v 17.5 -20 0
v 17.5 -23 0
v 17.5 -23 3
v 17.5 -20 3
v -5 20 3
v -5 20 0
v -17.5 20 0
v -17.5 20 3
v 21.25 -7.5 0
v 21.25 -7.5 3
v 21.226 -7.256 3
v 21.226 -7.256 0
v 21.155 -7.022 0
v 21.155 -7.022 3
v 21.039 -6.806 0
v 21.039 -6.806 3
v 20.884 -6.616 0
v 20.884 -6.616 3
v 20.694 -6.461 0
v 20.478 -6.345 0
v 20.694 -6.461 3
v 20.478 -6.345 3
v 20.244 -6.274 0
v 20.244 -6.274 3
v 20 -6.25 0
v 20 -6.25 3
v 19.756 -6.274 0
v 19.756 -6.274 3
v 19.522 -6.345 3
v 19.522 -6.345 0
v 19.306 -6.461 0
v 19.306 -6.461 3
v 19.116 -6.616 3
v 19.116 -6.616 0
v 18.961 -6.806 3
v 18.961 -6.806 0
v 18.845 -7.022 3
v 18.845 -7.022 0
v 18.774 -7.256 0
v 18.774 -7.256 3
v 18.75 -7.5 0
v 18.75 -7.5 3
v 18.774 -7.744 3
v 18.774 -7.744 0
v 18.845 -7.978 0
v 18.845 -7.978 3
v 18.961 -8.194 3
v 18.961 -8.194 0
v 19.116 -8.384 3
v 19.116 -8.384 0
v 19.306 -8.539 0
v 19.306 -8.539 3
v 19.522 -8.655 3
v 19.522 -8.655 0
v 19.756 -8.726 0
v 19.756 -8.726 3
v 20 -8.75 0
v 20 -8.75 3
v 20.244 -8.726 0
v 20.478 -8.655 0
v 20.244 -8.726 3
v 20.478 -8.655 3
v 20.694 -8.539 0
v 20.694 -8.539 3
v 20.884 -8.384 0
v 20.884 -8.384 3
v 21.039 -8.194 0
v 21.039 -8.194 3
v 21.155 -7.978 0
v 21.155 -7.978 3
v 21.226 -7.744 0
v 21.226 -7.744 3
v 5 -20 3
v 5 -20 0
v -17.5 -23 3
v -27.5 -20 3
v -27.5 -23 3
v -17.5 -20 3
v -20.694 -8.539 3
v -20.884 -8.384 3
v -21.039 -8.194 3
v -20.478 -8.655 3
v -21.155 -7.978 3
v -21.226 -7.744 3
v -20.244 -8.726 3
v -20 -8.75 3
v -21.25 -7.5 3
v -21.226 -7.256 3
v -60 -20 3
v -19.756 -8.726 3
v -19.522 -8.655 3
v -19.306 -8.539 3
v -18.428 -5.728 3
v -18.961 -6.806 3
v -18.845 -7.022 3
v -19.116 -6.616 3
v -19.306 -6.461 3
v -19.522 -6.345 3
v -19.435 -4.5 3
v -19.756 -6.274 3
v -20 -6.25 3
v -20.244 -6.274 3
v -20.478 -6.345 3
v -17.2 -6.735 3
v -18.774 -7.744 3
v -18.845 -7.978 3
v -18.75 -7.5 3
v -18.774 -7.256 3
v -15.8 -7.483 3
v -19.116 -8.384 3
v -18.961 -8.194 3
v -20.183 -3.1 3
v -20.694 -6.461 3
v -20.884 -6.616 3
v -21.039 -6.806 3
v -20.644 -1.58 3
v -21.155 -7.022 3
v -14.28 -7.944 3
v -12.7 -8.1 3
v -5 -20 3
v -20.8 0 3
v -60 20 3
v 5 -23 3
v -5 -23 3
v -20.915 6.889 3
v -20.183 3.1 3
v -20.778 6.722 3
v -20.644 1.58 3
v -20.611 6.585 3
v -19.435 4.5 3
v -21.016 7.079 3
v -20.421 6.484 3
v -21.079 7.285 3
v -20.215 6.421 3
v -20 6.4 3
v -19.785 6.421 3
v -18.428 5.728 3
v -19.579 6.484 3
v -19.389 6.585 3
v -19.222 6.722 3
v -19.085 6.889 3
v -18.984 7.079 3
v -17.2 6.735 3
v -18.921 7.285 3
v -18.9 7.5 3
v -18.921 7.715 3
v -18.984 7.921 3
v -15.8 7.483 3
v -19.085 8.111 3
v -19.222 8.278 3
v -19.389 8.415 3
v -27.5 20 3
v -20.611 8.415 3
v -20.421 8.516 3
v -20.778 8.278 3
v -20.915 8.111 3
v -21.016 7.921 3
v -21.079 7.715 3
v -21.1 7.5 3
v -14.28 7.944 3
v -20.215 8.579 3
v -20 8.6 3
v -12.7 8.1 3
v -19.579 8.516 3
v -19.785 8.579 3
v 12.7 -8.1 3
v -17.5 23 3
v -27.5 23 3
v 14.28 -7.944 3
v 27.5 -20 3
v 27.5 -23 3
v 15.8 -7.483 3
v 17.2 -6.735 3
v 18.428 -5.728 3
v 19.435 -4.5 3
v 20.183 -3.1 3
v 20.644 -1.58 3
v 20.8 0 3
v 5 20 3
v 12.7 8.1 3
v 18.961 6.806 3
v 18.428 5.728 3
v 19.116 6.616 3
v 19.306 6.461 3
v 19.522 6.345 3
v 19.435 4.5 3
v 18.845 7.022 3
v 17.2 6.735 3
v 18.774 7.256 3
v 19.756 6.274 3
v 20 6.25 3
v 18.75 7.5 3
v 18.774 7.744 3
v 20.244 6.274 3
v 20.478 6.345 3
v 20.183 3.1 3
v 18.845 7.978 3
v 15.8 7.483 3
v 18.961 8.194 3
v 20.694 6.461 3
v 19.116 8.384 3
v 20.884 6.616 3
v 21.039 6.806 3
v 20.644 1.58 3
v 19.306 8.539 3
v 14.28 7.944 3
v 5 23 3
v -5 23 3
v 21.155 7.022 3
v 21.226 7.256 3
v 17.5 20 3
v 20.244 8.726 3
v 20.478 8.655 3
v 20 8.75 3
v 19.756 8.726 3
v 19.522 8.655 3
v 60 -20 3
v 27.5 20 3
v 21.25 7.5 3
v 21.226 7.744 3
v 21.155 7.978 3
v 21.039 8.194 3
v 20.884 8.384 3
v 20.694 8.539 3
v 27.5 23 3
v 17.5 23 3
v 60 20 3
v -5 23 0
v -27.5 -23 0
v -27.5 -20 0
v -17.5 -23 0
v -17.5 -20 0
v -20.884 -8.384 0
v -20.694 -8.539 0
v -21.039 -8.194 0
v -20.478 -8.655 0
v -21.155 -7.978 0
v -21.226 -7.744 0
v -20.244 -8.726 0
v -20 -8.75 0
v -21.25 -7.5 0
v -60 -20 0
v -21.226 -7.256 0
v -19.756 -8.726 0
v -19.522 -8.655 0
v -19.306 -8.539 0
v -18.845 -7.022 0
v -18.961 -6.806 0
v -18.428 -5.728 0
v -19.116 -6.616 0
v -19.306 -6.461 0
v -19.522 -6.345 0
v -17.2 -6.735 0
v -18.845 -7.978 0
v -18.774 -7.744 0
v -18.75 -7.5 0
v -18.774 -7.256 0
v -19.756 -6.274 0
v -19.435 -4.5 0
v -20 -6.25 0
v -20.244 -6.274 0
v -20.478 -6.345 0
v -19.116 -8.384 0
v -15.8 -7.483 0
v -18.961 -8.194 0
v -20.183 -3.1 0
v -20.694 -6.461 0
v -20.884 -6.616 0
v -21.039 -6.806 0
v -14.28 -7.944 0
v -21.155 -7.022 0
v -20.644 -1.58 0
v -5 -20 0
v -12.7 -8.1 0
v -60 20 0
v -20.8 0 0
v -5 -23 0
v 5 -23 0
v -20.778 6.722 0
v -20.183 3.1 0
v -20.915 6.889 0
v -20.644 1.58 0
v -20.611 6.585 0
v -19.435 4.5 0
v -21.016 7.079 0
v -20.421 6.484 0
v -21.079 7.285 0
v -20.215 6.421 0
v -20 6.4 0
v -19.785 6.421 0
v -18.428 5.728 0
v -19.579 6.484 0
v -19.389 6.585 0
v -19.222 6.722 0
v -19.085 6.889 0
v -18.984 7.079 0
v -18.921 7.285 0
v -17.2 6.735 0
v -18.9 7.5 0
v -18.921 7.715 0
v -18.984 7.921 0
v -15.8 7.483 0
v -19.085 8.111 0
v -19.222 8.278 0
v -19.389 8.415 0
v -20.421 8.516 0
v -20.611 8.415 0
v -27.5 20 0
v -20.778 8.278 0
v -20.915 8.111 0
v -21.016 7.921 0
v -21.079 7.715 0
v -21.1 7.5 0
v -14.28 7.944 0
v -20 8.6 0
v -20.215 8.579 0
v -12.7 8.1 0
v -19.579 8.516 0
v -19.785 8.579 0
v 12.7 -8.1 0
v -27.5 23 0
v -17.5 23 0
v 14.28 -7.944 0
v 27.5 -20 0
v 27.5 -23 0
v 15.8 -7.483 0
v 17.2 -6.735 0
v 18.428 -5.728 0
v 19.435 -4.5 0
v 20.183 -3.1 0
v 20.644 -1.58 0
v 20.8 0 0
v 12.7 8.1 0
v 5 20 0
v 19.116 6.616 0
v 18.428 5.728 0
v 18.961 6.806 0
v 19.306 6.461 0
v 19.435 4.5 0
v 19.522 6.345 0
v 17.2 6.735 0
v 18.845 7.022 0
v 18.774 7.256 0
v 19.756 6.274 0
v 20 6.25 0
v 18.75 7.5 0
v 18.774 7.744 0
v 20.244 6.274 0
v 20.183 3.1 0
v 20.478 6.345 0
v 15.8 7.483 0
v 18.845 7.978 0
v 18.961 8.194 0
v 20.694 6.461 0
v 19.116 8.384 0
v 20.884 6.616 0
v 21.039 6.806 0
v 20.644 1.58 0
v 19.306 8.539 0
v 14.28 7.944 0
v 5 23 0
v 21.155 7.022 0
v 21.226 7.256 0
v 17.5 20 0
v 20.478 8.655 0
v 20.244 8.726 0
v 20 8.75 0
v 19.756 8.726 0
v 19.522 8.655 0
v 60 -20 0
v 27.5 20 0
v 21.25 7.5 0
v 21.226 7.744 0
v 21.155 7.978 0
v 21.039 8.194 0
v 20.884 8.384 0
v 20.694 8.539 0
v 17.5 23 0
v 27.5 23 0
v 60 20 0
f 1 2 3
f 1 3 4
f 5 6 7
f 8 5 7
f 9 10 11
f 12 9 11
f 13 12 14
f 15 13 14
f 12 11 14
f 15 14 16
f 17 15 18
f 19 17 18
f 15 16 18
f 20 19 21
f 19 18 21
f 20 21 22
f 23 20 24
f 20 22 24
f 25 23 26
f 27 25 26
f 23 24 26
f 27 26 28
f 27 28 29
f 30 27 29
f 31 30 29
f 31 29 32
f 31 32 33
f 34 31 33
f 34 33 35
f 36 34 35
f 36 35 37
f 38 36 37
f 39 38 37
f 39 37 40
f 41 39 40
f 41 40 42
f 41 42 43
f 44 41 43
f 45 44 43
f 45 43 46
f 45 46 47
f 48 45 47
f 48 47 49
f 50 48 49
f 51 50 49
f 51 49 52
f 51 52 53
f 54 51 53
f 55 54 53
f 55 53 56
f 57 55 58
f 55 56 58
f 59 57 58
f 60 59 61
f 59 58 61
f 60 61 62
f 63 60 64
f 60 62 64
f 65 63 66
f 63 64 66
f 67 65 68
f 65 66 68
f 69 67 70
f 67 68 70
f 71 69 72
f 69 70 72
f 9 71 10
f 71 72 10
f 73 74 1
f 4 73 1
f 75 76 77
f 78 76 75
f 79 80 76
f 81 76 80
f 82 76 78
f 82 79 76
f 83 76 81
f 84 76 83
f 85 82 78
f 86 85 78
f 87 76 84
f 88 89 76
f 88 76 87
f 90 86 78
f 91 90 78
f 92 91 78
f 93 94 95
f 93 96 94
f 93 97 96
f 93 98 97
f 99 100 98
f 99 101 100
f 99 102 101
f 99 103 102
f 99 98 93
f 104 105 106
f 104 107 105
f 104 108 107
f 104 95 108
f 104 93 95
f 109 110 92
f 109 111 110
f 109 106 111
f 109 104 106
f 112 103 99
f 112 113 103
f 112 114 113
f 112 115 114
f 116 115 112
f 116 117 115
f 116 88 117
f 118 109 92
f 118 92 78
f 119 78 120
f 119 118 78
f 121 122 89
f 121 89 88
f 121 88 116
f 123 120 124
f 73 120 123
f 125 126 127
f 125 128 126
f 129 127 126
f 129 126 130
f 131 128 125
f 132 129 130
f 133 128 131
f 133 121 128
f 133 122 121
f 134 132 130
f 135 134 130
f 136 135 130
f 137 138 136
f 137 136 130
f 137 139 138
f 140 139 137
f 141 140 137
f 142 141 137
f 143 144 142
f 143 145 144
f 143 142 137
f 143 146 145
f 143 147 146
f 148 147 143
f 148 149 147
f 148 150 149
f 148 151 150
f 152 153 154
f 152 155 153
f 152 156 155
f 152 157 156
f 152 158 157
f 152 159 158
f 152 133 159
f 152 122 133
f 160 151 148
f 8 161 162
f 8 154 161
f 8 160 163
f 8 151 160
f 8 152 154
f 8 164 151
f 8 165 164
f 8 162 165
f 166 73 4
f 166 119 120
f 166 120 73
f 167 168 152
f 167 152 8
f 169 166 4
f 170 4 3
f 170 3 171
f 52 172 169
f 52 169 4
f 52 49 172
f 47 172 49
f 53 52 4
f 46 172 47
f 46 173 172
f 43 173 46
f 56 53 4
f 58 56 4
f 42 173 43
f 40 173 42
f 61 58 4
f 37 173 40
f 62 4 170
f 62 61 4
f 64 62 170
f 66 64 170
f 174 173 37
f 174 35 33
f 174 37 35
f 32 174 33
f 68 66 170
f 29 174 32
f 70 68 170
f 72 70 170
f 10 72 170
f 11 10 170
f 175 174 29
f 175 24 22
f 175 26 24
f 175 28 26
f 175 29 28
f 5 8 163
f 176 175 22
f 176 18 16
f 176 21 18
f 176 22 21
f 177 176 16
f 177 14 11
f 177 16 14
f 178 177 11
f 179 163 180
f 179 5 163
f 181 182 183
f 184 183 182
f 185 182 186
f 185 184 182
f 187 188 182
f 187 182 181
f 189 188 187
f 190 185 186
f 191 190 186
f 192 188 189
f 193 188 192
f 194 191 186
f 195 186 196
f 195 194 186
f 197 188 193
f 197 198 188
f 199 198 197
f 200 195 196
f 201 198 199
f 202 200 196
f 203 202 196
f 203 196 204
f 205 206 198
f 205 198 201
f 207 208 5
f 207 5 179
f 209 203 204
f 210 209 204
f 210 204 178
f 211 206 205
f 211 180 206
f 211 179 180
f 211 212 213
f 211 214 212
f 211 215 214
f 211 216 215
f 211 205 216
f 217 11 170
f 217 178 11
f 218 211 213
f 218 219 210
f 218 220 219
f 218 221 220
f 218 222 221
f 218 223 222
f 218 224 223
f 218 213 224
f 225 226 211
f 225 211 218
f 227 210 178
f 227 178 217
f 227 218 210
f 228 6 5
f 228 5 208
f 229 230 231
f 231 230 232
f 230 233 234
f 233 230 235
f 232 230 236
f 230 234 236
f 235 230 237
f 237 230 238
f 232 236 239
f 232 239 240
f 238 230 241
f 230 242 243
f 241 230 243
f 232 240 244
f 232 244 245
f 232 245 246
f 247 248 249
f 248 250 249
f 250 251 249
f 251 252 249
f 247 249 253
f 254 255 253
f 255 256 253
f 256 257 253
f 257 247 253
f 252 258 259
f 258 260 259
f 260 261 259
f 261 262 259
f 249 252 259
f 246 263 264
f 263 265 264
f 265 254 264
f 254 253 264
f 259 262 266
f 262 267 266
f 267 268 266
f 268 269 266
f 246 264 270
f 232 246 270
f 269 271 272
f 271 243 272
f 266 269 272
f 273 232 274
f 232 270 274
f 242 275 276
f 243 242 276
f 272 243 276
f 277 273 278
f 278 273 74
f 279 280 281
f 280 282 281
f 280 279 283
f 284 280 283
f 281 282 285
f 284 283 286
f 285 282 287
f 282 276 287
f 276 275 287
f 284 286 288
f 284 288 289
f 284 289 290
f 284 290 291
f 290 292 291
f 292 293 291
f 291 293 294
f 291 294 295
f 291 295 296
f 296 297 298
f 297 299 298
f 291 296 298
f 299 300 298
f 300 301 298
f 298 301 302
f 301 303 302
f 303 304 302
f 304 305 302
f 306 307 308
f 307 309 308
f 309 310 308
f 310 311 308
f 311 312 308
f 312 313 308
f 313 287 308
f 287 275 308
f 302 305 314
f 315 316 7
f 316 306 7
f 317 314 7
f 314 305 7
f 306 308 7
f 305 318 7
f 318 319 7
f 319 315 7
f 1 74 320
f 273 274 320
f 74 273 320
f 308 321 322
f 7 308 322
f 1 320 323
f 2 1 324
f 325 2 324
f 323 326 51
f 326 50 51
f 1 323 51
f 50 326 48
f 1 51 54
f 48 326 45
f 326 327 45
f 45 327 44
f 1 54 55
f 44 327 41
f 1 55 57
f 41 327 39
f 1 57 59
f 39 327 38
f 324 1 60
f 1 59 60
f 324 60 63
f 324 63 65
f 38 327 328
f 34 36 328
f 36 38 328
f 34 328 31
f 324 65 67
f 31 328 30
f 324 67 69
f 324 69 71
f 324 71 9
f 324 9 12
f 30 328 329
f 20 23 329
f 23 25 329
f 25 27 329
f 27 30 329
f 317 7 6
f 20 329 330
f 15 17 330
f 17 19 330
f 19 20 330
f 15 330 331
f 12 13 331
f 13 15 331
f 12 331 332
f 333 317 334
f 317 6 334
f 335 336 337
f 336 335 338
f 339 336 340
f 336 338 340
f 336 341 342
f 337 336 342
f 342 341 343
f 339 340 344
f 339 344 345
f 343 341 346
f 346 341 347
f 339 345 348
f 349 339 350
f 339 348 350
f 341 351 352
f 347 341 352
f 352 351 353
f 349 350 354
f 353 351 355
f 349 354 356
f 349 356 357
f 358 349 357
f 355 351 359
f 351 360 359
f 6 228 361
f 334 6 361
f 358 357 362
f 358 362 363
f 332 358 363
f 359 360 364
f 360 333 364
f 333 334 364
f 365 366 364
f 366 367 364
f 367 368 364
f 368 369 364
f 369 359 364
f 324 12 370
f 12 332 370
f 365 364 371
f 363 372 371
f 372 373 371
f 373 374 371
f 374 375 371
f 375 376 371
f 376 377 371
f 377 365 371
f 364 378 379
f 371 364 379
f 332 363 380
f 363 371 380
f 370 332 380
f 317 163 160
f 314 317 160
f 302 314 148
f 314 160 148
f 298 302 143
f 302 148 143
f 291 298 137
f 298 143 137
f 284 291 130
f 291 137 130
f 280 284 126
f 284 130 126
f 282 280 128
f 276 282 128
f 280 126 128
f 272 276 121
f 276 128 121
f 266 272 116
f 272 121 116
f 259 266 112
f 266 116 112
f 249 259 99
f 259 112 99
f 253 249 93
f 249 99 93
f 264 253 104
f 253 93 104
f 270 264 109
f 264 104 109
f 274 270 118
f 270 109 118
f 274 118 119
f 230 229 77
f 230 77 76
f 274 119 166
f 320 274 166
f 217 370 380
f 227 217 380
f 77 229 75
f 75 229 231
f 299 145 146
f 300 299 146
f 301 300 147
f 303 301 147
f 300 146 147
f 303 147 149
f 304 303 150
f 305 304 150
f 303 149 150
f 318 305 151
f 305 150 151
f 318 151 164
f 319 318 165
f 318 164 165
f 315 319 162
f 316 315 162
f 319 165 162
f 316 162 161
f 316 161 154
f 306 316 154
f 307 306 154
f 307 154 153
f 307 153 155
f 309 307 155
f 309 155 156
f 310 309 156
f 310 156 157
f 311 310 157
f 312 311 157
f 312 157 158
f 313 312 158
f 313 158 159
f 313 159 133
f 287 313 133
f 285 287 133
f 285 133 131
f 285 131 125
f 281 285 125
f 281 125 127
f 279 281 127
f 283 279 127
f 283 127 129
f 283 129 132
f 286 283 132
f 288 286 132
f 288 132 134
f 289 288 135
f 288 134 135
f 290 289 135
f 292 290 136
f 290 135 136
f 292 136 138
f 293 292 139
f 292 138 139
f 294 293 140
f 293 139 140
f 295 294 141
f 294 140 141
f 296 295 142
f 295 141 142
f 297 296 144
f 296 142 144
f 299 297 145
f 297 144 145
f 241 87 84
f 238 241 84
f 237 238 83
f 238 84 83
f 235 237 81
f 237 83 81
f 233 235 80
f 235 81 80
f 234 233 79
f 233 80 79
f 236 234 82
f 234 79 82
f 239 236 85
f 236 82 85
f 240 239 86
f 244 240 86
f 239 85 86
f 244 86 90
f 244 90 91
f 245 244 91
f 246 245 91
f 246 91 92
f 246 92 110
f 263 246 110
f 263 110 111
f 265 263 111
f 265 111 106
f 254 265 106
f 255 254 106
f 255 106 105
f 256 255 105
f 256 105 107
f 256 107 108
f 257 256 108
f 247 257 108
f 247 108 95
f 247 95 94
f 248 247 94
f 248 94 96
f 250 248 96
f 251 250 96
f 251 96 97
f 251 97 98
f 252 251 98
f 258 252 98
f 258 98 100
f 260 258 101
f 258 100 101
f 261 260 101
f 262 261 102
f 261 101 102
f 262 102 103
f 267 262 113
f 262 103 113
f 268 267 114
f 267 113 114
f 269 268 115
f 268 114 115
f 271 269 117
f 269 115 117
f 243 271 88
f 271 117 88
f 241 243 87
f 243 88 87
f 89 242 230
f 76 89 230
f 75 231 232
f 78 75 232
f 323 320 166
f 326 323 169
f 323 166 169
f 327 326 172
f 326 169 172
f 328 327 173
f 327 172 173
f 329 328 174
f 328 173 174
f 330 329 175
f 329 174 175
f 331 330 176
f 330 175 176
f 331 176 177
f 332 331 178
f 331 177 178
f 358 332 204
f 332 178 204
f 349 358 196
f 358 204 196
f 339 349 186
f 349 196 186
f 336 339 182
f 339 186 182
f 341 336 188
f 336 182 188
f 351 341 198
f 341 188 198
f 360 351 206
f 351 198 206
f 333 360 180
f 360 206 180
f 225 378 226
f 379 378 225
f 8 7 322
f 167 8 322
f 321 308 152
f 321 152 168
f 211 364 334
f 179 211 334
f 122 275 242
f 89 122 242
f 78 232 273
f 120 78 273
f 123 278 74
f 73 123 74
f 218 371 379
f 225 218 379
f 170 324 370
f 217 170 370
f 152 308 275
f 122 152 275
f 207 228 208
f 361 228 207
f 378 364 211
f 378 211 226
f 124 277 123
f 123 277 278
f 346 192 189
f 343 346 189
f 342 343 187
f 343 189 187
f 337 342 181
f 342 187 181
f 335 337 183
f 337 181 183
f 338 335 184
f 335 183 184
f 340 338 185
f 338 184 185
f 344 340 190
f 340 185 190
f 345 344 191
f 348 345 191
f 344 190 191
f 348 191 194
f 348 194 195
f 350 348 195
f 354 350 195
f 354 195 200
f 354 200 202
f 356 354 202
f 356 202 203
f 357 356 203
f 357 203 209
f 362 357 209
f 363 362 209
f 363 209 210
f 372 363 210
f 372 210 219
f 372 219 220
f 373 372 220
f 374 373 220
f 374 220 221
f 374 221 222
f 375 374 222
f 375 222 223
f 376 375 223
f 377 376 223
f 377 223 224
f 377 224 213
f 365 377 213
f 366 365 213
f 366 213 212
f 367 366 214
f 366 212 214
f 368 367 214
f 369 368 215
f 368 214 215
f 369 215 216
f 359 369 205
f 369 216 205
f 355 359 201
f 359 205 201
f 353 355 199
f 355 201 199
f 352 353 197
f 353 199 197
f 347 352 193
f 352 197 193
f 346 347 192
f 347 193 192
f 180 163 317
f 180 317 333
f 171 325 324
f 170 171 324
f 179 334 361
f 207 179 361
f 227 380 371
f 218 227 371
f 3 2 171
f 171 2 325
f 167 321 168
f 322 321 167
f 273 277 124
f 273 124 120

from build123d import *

# Parameters (mm, degrees)
SKETCH1_W           = 10
SKETCH1_H           = 3
BOSS_EXTRUDE1_DEPTH = 3
SKETCH2_R           = 1.1
SKETCH2_R_2         = 1.25
SKETCH2_R_3         = 8.1
CUT_EXTRUDE1_DEPTH  = 65.327288144
SKETCH3_W           = 25.4
SKETCH3_H           = 16.2
CUT_EXTRUDE2_DEPTH  = 65.327288144


with BuildPart() as part:
    # Sketch1 → Boss-Extrude1 (new body)
    with BuildSketch(Plane.XY):
        Polygon((-60, 20), (-60, 0), (60, 0), (60, 20), (27.5, 20), (17.5, 20), (5, 20), (-5, 20), (-17.5, 20), (-27.5, 20), align=None)
        Polygon((60, 0), (-60, 0), (-60, -20), (-27.5, -20), (-17.5, -20), (-5, -20), (5, -20), (17.5, -20), (27.5, -20), (60, -20), align=None)
        with Locations((-22.5, 21.5)):
            Rectangle(SKETCH1_W, SKETCH1_H)
        with Locations((0, 21.5)):
            Rectangle(SKETCH1_W, SKETCH1_H)
        with Locations((22.5, 21.5)):
            Rectangle(SKETCH1_W, SKETCH1_H)
        with Locations((22.5, -21.5)):
            Rectangle(SKETCH1_W, SKETCH1_H)
        with Locations((0, -21.5)):
            Rectangle(SKETCH1_W, SKETCH1_H)
        with Locations((-22.5, -21.5)):
            Rectangle(SKETCH1_W, SKETCH1_H)
    extrude(amount=BOSS_EXTRUDE1_DEPTH)

    # Sketch2 → Cut-Extrude1 (cut, through all)
    with BuildSketch(Plane.XY.offset(3)):
        with Locations((-20, 7.5)):
            Circle(SKETCH2_R)
        with Locations(Location((-20, -7.5, 0), (0, 0, 180))):
            Circle(SKETCH2_R_2)
        with Locations((20, -7.5)):
            Circle(SKETCH2_R_2)
        with Locations(Location((20, 7.5, 0), (0, 0, 180))):
            Circle(SKETCH2_R_2)
        with Locations((-12.7, 0)):
            Circle(SKETCH2_R_3)
        with Locations((12.7, 0)):
            Circle(SKETCH2_R_3)
    extrude(amount=-CUT_EXTRUDE1_DEPTH, mode=Mode.SUBTRACT)

    # Sketch3 → Cut-Extrude2 (cut, through all)
    with BuildSketch(Plane.XY.offset(3)):
        Rectangle(SKETCH3_W, SKETCH3_H)
    extrude(amount=-CUT_EXTRUDE2_DEPTH, mode=Mode.SUBTRACT)


solid = part.part
